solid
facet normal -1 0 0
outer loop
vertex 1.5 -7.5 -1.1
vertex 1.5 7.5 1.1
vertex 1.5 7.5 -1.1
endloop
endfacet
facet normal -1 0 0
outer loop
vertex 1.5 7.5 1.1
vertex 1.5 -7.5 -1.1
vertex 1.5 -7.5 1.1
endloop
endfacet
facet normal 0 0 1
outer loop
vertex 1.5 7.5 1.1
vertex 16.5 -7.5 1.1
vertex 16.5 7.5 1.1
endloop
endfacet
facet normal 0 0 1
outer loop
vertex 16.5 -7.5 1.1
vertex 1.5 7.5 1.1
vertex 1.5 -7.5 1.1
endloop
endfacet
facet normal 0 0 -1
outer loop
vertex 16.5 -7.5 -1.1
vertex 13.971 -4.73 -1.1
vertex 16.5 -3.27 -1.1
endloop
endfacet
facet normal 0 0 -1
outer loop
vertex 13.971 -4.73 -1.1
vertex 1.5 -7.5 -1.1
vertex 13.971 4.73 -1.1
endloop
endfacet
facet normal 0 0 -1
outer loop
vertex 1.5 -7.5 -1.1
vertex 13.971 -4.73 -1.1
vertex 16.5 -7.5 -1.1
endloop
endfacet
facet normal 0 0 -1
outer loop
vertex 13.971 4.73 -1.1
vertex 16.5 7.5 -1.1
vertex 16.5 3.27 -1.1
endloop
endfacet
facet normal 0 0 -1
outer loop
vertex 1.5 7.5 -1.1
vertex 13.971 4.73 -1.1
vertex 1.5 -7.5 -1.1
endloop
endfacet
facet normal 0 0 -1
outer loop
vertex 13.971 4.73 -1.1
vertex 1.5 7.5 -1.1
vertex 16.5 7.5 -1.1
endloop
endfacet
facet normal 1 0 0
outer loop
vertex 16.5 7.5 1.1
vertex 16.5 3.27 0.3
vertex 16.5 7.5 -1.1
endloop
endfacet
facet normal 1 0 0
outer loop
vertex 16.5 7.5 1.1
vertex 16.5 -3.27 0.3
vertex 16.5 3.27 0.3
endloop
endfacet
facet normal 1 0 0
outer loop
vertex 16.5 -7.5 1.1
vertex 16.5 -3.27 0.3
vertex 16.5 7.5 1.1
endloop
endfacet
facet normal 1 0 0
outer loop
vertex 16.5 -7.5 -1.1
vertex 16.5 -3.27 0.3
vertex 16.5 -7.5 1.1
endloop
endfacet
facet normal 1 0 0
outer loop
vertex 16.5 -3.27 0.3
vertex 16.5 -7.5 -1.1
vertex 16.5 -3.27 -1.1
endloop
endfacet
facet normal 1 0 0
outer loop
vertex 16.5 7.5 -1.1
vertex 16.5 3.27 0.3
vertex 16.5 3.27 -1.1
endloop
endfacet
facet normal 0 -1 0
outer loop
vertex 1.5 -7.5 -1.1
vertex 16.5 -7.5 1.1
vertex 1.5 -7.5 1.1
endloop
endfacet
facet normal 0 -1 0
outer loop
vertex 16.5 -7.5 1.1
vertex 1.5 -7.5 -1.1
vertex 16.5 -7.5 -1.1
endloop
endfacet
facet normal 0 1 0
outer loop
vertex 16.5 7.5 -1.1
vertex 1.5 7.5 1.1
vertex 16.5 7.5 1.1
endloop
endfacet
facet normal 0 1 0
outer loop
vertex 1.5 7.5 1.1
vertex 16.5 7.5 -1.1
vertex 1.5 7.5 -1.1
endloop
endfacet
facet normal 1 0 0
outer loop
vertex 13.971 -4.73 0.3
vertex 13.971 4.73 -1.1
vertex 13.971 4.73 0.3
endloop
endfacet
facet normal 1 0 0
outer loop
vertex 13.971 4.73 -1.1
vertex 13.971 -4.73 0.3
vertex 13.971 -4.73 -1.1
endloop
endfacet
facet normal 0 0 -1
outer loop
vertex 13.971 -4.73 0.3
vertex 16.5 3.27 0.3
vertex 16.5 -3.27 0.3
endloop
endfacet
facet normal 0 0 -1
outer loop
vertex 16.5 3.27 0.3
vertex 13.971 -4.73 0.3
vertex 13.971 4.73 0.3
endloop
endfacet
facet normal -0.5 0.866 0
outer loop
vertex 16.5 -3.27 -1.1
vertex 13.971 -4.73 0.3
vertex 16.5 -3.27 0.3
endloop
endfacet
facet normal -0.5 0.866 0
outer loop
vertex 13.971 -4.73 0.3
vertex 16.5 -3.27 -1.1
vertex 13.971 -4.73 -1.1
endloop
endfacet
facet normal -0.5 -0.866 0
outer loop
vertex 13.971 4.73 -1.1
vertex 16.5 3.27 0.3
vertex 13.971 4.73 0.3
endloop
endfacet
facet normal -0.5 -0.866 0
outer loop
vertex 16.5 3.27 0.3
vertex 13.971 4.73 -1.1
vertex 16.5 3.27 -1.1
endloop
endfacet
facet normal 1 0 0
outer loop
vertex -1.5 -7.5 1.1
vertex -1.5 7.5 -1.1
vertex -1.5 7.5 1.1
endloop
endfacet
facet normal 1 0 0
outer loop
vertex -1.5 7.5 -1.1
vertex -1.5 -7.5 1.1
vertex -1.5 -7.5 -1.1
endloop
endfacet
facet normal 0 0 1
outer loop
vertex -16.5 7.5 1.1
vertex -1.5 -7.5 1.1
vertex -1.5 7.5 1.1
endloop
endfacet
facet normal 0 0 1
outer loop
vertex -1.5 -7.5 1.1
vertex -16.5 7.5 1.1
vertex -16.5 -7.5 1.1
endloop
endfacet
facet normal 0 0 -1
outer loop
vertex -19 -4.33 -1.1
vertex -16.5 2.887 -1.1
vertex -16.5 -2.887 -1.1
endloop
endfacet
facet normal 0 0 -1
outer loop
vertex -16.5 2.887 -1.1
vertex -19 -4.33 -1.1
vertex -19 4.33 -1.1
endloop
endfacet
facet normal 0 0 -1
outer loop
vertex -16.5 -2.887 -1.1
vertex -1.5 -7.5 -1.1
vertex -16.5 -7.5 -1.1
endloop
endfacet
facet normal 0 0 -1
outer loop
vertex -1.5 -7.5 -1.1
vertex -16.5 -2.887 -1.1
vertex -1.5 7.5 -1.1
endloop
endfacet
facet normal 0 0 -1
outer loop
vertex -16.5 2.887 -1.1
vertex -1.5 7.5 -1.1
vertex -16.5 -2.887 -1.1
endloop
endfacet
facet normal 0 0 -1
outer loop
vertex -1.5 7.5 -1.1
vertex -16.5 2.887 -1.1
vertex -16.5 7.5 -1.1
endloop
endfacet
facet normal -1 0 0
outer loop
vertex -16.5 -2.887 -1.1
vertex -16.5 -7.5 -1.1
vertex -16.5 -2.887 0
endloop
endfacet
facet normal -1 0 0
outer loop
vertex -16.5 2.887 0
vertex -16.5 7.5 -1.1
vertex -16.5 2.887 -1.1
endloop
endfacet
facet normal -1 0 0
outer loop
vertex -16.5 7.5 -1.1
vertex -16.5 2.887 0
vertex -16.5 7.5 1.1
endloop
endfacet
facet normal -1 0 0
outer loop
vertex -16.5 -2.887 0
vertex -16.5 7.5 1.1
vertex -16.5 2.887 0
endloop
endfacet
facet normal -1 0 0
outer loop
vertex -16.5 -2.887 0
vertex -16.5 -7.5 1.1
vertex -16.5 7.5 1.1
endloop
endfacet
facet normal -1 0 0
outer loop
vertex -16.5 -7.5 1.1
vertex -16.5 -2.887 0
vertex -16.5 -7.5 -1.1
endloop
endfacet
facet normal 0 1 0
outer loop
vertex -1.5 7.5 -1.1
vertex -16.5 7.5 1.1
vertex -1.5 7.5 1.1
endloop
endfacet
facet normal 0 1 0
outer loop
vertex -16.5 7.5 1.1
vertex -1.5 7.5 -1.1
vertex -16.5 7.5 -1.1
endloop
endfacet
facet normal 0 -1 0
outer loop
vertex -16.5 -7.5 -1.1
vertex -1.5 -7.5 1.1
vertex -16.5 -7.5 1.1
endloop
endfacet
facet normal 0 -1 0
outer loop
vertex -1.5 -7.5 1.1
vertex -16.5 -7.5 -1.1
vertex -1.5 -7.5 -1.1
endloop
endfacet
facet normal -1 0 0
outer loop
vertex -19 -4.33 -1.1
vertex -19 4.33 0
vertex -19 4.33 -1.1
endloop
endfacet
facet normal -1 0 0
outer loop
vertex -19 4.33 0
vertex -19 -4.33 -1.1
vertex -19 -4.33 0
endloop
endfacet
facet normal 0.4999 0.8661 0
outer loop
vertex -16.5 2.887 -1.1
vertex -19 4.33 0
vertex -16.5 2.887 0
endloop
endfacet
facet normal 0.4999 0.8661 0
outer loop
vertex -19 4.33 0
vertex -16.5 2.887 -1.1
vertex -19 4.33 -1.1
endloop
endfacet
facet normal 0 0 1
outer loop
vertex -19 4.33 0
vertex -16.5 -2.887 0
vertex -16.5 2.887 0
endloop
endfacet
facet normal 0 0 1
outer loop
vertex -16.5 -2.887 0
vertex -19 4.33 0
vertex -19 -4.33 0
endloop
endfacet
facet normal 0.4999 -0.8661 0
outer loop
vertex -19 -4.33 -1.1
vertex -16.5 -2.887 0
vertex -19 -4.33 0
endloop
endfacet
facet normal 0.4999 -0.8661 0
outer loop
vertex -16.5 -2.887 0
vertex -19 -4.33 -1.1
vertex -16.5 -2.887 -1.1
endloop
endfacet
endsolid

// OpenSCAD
side=30;
//thickness of the board
thick=2.2;
edge_thick=3;
//coefficient of the thickness of the board
edge_height_coef=1.5;//[1:0.1:3]

//printer tolerance (only affect "color 02" parts)
tolerance=0.2;//[0:0.05:0.7]
//definition (only affect corners)
$fn=50;
render="Test part";//[Corner color 01,Corner color 02,Edge color 01,Edge color 02,Center color 01,Center color 02,Test part]

////////
module slot() {
translate([-side/2,0,-thick/2-0.2]) rotate([0,0,180]) translate([0.2,0,0]) hull() {for(i=[-1,1]) translate([-0.5-2*tolerance/1.75,i*(0.866+2*tolerance),0]) cylinder(d=8,h=thick/2+0.5,$fn=3);}
}
module couleur01(a) {
    cube([side,side,thick],center=true);
    for(i=[0,90]) rotate([0,0,i])
    translate([-side/2,0,-thick/2]) cylinder(d=10,h=thick/2,$fn=3);
    if (a==2) {
        for(i=[0,-90]) rotate([0,0,i])
        translate([-side/2,side/2,-thick/2]) cube([side,edge_thick,edge_height_coef*thick]);
        difference() {
            translate([side/2,side/2,-thick/2]) cylinder(r=edge_thick,h=edge_height_coef*thick);
            cube([side,side,2*edge_height_coef*thick],center=true);
        }
    }
    if (a==3) {
        rotate([0,0,180])
        translate([-side/2,0,-thick/2]) cylinder(d=10,h=thick/2,$fn=3);
        translate([-side/2,side/2,-thick/2]) cube([side,edge_thick,edge_height_coef*thick]);
    }
    else if (a==4) {
        for(i=[180,-90]) rotate([0,0,i])
        translate([-side/2,0,-thick/2]) cylinder(d=10,h=thick/2,$fn=3);
    }
    else {};
}

module couleur02(a) {
    difference() {
        cube([side,side,thick],center=true);
        for(i=[0,90]) rotate([0,0,i])
        slot();
        if (a==3) {
            rotate([0,0,180]) slot();
        }
        else if (a==4) {
            for(i=[180,-90]) rotate([0,0,i]) slot();
        }
        else {};
    }
    if (a==2) {
        for(i=[0,-90]) rotate([0,0,i])
        translate([-side/2,side/2,-thick/2]) cube([side,edge_thick,edge_height_coef*thick]);
        difference() {
            translate([side/2,side/2,-thick/2]) cylinder(r=edge_thick,h=edge_height_coef*thick);
            cube([side,side,2*edge_height_coef*thick],center=true);
        }
    }
    if (a==3) {
        translate([-side/2,side/2,-thick/2]) cube([side,edge_thick,edge_height_coef*thick]);
    }
}

if (render=="Corner color 01") {
    couleur01(2);
}
else if (render=="Corner color 02") {
    couleur02(2);
}
else if (render=="Edge color 01") {
    couleur01(3);
}
else if (render=="Edge color 02") {
    couleur02(3);
}
else if (render=="Center color 01") {
    couleur01(4);
}
else if (render=="Center color 02") {
    couleur02(4);
}
else if (render=="Test part") {
    rotate([0,0,180]) translate([-1.5,0,0]) difference() {
        translate([-7.5,0,0]) cube([15,15,thick],center=true);
        translate([-30/2,0,-thick/2-0.2]) rotate([0,0,180]) translate([0.2,0,0]) hull() {for(i=[-1,1]) translate([-0.5-2*tolerance/1.75,i*(0.866+2*tolerance),0]) cylinder(d=8,h=thick/2+0.5,$fn=3);}
    }
    translate([-1.5,0,0]) union() {
        translate([-7.5,0,0]) cube([15,15,thick],center=true);
        translate([-30/2,0,-thick/2]) cylinder(d=10,h=thick/2,$fn=3);
    }
}
